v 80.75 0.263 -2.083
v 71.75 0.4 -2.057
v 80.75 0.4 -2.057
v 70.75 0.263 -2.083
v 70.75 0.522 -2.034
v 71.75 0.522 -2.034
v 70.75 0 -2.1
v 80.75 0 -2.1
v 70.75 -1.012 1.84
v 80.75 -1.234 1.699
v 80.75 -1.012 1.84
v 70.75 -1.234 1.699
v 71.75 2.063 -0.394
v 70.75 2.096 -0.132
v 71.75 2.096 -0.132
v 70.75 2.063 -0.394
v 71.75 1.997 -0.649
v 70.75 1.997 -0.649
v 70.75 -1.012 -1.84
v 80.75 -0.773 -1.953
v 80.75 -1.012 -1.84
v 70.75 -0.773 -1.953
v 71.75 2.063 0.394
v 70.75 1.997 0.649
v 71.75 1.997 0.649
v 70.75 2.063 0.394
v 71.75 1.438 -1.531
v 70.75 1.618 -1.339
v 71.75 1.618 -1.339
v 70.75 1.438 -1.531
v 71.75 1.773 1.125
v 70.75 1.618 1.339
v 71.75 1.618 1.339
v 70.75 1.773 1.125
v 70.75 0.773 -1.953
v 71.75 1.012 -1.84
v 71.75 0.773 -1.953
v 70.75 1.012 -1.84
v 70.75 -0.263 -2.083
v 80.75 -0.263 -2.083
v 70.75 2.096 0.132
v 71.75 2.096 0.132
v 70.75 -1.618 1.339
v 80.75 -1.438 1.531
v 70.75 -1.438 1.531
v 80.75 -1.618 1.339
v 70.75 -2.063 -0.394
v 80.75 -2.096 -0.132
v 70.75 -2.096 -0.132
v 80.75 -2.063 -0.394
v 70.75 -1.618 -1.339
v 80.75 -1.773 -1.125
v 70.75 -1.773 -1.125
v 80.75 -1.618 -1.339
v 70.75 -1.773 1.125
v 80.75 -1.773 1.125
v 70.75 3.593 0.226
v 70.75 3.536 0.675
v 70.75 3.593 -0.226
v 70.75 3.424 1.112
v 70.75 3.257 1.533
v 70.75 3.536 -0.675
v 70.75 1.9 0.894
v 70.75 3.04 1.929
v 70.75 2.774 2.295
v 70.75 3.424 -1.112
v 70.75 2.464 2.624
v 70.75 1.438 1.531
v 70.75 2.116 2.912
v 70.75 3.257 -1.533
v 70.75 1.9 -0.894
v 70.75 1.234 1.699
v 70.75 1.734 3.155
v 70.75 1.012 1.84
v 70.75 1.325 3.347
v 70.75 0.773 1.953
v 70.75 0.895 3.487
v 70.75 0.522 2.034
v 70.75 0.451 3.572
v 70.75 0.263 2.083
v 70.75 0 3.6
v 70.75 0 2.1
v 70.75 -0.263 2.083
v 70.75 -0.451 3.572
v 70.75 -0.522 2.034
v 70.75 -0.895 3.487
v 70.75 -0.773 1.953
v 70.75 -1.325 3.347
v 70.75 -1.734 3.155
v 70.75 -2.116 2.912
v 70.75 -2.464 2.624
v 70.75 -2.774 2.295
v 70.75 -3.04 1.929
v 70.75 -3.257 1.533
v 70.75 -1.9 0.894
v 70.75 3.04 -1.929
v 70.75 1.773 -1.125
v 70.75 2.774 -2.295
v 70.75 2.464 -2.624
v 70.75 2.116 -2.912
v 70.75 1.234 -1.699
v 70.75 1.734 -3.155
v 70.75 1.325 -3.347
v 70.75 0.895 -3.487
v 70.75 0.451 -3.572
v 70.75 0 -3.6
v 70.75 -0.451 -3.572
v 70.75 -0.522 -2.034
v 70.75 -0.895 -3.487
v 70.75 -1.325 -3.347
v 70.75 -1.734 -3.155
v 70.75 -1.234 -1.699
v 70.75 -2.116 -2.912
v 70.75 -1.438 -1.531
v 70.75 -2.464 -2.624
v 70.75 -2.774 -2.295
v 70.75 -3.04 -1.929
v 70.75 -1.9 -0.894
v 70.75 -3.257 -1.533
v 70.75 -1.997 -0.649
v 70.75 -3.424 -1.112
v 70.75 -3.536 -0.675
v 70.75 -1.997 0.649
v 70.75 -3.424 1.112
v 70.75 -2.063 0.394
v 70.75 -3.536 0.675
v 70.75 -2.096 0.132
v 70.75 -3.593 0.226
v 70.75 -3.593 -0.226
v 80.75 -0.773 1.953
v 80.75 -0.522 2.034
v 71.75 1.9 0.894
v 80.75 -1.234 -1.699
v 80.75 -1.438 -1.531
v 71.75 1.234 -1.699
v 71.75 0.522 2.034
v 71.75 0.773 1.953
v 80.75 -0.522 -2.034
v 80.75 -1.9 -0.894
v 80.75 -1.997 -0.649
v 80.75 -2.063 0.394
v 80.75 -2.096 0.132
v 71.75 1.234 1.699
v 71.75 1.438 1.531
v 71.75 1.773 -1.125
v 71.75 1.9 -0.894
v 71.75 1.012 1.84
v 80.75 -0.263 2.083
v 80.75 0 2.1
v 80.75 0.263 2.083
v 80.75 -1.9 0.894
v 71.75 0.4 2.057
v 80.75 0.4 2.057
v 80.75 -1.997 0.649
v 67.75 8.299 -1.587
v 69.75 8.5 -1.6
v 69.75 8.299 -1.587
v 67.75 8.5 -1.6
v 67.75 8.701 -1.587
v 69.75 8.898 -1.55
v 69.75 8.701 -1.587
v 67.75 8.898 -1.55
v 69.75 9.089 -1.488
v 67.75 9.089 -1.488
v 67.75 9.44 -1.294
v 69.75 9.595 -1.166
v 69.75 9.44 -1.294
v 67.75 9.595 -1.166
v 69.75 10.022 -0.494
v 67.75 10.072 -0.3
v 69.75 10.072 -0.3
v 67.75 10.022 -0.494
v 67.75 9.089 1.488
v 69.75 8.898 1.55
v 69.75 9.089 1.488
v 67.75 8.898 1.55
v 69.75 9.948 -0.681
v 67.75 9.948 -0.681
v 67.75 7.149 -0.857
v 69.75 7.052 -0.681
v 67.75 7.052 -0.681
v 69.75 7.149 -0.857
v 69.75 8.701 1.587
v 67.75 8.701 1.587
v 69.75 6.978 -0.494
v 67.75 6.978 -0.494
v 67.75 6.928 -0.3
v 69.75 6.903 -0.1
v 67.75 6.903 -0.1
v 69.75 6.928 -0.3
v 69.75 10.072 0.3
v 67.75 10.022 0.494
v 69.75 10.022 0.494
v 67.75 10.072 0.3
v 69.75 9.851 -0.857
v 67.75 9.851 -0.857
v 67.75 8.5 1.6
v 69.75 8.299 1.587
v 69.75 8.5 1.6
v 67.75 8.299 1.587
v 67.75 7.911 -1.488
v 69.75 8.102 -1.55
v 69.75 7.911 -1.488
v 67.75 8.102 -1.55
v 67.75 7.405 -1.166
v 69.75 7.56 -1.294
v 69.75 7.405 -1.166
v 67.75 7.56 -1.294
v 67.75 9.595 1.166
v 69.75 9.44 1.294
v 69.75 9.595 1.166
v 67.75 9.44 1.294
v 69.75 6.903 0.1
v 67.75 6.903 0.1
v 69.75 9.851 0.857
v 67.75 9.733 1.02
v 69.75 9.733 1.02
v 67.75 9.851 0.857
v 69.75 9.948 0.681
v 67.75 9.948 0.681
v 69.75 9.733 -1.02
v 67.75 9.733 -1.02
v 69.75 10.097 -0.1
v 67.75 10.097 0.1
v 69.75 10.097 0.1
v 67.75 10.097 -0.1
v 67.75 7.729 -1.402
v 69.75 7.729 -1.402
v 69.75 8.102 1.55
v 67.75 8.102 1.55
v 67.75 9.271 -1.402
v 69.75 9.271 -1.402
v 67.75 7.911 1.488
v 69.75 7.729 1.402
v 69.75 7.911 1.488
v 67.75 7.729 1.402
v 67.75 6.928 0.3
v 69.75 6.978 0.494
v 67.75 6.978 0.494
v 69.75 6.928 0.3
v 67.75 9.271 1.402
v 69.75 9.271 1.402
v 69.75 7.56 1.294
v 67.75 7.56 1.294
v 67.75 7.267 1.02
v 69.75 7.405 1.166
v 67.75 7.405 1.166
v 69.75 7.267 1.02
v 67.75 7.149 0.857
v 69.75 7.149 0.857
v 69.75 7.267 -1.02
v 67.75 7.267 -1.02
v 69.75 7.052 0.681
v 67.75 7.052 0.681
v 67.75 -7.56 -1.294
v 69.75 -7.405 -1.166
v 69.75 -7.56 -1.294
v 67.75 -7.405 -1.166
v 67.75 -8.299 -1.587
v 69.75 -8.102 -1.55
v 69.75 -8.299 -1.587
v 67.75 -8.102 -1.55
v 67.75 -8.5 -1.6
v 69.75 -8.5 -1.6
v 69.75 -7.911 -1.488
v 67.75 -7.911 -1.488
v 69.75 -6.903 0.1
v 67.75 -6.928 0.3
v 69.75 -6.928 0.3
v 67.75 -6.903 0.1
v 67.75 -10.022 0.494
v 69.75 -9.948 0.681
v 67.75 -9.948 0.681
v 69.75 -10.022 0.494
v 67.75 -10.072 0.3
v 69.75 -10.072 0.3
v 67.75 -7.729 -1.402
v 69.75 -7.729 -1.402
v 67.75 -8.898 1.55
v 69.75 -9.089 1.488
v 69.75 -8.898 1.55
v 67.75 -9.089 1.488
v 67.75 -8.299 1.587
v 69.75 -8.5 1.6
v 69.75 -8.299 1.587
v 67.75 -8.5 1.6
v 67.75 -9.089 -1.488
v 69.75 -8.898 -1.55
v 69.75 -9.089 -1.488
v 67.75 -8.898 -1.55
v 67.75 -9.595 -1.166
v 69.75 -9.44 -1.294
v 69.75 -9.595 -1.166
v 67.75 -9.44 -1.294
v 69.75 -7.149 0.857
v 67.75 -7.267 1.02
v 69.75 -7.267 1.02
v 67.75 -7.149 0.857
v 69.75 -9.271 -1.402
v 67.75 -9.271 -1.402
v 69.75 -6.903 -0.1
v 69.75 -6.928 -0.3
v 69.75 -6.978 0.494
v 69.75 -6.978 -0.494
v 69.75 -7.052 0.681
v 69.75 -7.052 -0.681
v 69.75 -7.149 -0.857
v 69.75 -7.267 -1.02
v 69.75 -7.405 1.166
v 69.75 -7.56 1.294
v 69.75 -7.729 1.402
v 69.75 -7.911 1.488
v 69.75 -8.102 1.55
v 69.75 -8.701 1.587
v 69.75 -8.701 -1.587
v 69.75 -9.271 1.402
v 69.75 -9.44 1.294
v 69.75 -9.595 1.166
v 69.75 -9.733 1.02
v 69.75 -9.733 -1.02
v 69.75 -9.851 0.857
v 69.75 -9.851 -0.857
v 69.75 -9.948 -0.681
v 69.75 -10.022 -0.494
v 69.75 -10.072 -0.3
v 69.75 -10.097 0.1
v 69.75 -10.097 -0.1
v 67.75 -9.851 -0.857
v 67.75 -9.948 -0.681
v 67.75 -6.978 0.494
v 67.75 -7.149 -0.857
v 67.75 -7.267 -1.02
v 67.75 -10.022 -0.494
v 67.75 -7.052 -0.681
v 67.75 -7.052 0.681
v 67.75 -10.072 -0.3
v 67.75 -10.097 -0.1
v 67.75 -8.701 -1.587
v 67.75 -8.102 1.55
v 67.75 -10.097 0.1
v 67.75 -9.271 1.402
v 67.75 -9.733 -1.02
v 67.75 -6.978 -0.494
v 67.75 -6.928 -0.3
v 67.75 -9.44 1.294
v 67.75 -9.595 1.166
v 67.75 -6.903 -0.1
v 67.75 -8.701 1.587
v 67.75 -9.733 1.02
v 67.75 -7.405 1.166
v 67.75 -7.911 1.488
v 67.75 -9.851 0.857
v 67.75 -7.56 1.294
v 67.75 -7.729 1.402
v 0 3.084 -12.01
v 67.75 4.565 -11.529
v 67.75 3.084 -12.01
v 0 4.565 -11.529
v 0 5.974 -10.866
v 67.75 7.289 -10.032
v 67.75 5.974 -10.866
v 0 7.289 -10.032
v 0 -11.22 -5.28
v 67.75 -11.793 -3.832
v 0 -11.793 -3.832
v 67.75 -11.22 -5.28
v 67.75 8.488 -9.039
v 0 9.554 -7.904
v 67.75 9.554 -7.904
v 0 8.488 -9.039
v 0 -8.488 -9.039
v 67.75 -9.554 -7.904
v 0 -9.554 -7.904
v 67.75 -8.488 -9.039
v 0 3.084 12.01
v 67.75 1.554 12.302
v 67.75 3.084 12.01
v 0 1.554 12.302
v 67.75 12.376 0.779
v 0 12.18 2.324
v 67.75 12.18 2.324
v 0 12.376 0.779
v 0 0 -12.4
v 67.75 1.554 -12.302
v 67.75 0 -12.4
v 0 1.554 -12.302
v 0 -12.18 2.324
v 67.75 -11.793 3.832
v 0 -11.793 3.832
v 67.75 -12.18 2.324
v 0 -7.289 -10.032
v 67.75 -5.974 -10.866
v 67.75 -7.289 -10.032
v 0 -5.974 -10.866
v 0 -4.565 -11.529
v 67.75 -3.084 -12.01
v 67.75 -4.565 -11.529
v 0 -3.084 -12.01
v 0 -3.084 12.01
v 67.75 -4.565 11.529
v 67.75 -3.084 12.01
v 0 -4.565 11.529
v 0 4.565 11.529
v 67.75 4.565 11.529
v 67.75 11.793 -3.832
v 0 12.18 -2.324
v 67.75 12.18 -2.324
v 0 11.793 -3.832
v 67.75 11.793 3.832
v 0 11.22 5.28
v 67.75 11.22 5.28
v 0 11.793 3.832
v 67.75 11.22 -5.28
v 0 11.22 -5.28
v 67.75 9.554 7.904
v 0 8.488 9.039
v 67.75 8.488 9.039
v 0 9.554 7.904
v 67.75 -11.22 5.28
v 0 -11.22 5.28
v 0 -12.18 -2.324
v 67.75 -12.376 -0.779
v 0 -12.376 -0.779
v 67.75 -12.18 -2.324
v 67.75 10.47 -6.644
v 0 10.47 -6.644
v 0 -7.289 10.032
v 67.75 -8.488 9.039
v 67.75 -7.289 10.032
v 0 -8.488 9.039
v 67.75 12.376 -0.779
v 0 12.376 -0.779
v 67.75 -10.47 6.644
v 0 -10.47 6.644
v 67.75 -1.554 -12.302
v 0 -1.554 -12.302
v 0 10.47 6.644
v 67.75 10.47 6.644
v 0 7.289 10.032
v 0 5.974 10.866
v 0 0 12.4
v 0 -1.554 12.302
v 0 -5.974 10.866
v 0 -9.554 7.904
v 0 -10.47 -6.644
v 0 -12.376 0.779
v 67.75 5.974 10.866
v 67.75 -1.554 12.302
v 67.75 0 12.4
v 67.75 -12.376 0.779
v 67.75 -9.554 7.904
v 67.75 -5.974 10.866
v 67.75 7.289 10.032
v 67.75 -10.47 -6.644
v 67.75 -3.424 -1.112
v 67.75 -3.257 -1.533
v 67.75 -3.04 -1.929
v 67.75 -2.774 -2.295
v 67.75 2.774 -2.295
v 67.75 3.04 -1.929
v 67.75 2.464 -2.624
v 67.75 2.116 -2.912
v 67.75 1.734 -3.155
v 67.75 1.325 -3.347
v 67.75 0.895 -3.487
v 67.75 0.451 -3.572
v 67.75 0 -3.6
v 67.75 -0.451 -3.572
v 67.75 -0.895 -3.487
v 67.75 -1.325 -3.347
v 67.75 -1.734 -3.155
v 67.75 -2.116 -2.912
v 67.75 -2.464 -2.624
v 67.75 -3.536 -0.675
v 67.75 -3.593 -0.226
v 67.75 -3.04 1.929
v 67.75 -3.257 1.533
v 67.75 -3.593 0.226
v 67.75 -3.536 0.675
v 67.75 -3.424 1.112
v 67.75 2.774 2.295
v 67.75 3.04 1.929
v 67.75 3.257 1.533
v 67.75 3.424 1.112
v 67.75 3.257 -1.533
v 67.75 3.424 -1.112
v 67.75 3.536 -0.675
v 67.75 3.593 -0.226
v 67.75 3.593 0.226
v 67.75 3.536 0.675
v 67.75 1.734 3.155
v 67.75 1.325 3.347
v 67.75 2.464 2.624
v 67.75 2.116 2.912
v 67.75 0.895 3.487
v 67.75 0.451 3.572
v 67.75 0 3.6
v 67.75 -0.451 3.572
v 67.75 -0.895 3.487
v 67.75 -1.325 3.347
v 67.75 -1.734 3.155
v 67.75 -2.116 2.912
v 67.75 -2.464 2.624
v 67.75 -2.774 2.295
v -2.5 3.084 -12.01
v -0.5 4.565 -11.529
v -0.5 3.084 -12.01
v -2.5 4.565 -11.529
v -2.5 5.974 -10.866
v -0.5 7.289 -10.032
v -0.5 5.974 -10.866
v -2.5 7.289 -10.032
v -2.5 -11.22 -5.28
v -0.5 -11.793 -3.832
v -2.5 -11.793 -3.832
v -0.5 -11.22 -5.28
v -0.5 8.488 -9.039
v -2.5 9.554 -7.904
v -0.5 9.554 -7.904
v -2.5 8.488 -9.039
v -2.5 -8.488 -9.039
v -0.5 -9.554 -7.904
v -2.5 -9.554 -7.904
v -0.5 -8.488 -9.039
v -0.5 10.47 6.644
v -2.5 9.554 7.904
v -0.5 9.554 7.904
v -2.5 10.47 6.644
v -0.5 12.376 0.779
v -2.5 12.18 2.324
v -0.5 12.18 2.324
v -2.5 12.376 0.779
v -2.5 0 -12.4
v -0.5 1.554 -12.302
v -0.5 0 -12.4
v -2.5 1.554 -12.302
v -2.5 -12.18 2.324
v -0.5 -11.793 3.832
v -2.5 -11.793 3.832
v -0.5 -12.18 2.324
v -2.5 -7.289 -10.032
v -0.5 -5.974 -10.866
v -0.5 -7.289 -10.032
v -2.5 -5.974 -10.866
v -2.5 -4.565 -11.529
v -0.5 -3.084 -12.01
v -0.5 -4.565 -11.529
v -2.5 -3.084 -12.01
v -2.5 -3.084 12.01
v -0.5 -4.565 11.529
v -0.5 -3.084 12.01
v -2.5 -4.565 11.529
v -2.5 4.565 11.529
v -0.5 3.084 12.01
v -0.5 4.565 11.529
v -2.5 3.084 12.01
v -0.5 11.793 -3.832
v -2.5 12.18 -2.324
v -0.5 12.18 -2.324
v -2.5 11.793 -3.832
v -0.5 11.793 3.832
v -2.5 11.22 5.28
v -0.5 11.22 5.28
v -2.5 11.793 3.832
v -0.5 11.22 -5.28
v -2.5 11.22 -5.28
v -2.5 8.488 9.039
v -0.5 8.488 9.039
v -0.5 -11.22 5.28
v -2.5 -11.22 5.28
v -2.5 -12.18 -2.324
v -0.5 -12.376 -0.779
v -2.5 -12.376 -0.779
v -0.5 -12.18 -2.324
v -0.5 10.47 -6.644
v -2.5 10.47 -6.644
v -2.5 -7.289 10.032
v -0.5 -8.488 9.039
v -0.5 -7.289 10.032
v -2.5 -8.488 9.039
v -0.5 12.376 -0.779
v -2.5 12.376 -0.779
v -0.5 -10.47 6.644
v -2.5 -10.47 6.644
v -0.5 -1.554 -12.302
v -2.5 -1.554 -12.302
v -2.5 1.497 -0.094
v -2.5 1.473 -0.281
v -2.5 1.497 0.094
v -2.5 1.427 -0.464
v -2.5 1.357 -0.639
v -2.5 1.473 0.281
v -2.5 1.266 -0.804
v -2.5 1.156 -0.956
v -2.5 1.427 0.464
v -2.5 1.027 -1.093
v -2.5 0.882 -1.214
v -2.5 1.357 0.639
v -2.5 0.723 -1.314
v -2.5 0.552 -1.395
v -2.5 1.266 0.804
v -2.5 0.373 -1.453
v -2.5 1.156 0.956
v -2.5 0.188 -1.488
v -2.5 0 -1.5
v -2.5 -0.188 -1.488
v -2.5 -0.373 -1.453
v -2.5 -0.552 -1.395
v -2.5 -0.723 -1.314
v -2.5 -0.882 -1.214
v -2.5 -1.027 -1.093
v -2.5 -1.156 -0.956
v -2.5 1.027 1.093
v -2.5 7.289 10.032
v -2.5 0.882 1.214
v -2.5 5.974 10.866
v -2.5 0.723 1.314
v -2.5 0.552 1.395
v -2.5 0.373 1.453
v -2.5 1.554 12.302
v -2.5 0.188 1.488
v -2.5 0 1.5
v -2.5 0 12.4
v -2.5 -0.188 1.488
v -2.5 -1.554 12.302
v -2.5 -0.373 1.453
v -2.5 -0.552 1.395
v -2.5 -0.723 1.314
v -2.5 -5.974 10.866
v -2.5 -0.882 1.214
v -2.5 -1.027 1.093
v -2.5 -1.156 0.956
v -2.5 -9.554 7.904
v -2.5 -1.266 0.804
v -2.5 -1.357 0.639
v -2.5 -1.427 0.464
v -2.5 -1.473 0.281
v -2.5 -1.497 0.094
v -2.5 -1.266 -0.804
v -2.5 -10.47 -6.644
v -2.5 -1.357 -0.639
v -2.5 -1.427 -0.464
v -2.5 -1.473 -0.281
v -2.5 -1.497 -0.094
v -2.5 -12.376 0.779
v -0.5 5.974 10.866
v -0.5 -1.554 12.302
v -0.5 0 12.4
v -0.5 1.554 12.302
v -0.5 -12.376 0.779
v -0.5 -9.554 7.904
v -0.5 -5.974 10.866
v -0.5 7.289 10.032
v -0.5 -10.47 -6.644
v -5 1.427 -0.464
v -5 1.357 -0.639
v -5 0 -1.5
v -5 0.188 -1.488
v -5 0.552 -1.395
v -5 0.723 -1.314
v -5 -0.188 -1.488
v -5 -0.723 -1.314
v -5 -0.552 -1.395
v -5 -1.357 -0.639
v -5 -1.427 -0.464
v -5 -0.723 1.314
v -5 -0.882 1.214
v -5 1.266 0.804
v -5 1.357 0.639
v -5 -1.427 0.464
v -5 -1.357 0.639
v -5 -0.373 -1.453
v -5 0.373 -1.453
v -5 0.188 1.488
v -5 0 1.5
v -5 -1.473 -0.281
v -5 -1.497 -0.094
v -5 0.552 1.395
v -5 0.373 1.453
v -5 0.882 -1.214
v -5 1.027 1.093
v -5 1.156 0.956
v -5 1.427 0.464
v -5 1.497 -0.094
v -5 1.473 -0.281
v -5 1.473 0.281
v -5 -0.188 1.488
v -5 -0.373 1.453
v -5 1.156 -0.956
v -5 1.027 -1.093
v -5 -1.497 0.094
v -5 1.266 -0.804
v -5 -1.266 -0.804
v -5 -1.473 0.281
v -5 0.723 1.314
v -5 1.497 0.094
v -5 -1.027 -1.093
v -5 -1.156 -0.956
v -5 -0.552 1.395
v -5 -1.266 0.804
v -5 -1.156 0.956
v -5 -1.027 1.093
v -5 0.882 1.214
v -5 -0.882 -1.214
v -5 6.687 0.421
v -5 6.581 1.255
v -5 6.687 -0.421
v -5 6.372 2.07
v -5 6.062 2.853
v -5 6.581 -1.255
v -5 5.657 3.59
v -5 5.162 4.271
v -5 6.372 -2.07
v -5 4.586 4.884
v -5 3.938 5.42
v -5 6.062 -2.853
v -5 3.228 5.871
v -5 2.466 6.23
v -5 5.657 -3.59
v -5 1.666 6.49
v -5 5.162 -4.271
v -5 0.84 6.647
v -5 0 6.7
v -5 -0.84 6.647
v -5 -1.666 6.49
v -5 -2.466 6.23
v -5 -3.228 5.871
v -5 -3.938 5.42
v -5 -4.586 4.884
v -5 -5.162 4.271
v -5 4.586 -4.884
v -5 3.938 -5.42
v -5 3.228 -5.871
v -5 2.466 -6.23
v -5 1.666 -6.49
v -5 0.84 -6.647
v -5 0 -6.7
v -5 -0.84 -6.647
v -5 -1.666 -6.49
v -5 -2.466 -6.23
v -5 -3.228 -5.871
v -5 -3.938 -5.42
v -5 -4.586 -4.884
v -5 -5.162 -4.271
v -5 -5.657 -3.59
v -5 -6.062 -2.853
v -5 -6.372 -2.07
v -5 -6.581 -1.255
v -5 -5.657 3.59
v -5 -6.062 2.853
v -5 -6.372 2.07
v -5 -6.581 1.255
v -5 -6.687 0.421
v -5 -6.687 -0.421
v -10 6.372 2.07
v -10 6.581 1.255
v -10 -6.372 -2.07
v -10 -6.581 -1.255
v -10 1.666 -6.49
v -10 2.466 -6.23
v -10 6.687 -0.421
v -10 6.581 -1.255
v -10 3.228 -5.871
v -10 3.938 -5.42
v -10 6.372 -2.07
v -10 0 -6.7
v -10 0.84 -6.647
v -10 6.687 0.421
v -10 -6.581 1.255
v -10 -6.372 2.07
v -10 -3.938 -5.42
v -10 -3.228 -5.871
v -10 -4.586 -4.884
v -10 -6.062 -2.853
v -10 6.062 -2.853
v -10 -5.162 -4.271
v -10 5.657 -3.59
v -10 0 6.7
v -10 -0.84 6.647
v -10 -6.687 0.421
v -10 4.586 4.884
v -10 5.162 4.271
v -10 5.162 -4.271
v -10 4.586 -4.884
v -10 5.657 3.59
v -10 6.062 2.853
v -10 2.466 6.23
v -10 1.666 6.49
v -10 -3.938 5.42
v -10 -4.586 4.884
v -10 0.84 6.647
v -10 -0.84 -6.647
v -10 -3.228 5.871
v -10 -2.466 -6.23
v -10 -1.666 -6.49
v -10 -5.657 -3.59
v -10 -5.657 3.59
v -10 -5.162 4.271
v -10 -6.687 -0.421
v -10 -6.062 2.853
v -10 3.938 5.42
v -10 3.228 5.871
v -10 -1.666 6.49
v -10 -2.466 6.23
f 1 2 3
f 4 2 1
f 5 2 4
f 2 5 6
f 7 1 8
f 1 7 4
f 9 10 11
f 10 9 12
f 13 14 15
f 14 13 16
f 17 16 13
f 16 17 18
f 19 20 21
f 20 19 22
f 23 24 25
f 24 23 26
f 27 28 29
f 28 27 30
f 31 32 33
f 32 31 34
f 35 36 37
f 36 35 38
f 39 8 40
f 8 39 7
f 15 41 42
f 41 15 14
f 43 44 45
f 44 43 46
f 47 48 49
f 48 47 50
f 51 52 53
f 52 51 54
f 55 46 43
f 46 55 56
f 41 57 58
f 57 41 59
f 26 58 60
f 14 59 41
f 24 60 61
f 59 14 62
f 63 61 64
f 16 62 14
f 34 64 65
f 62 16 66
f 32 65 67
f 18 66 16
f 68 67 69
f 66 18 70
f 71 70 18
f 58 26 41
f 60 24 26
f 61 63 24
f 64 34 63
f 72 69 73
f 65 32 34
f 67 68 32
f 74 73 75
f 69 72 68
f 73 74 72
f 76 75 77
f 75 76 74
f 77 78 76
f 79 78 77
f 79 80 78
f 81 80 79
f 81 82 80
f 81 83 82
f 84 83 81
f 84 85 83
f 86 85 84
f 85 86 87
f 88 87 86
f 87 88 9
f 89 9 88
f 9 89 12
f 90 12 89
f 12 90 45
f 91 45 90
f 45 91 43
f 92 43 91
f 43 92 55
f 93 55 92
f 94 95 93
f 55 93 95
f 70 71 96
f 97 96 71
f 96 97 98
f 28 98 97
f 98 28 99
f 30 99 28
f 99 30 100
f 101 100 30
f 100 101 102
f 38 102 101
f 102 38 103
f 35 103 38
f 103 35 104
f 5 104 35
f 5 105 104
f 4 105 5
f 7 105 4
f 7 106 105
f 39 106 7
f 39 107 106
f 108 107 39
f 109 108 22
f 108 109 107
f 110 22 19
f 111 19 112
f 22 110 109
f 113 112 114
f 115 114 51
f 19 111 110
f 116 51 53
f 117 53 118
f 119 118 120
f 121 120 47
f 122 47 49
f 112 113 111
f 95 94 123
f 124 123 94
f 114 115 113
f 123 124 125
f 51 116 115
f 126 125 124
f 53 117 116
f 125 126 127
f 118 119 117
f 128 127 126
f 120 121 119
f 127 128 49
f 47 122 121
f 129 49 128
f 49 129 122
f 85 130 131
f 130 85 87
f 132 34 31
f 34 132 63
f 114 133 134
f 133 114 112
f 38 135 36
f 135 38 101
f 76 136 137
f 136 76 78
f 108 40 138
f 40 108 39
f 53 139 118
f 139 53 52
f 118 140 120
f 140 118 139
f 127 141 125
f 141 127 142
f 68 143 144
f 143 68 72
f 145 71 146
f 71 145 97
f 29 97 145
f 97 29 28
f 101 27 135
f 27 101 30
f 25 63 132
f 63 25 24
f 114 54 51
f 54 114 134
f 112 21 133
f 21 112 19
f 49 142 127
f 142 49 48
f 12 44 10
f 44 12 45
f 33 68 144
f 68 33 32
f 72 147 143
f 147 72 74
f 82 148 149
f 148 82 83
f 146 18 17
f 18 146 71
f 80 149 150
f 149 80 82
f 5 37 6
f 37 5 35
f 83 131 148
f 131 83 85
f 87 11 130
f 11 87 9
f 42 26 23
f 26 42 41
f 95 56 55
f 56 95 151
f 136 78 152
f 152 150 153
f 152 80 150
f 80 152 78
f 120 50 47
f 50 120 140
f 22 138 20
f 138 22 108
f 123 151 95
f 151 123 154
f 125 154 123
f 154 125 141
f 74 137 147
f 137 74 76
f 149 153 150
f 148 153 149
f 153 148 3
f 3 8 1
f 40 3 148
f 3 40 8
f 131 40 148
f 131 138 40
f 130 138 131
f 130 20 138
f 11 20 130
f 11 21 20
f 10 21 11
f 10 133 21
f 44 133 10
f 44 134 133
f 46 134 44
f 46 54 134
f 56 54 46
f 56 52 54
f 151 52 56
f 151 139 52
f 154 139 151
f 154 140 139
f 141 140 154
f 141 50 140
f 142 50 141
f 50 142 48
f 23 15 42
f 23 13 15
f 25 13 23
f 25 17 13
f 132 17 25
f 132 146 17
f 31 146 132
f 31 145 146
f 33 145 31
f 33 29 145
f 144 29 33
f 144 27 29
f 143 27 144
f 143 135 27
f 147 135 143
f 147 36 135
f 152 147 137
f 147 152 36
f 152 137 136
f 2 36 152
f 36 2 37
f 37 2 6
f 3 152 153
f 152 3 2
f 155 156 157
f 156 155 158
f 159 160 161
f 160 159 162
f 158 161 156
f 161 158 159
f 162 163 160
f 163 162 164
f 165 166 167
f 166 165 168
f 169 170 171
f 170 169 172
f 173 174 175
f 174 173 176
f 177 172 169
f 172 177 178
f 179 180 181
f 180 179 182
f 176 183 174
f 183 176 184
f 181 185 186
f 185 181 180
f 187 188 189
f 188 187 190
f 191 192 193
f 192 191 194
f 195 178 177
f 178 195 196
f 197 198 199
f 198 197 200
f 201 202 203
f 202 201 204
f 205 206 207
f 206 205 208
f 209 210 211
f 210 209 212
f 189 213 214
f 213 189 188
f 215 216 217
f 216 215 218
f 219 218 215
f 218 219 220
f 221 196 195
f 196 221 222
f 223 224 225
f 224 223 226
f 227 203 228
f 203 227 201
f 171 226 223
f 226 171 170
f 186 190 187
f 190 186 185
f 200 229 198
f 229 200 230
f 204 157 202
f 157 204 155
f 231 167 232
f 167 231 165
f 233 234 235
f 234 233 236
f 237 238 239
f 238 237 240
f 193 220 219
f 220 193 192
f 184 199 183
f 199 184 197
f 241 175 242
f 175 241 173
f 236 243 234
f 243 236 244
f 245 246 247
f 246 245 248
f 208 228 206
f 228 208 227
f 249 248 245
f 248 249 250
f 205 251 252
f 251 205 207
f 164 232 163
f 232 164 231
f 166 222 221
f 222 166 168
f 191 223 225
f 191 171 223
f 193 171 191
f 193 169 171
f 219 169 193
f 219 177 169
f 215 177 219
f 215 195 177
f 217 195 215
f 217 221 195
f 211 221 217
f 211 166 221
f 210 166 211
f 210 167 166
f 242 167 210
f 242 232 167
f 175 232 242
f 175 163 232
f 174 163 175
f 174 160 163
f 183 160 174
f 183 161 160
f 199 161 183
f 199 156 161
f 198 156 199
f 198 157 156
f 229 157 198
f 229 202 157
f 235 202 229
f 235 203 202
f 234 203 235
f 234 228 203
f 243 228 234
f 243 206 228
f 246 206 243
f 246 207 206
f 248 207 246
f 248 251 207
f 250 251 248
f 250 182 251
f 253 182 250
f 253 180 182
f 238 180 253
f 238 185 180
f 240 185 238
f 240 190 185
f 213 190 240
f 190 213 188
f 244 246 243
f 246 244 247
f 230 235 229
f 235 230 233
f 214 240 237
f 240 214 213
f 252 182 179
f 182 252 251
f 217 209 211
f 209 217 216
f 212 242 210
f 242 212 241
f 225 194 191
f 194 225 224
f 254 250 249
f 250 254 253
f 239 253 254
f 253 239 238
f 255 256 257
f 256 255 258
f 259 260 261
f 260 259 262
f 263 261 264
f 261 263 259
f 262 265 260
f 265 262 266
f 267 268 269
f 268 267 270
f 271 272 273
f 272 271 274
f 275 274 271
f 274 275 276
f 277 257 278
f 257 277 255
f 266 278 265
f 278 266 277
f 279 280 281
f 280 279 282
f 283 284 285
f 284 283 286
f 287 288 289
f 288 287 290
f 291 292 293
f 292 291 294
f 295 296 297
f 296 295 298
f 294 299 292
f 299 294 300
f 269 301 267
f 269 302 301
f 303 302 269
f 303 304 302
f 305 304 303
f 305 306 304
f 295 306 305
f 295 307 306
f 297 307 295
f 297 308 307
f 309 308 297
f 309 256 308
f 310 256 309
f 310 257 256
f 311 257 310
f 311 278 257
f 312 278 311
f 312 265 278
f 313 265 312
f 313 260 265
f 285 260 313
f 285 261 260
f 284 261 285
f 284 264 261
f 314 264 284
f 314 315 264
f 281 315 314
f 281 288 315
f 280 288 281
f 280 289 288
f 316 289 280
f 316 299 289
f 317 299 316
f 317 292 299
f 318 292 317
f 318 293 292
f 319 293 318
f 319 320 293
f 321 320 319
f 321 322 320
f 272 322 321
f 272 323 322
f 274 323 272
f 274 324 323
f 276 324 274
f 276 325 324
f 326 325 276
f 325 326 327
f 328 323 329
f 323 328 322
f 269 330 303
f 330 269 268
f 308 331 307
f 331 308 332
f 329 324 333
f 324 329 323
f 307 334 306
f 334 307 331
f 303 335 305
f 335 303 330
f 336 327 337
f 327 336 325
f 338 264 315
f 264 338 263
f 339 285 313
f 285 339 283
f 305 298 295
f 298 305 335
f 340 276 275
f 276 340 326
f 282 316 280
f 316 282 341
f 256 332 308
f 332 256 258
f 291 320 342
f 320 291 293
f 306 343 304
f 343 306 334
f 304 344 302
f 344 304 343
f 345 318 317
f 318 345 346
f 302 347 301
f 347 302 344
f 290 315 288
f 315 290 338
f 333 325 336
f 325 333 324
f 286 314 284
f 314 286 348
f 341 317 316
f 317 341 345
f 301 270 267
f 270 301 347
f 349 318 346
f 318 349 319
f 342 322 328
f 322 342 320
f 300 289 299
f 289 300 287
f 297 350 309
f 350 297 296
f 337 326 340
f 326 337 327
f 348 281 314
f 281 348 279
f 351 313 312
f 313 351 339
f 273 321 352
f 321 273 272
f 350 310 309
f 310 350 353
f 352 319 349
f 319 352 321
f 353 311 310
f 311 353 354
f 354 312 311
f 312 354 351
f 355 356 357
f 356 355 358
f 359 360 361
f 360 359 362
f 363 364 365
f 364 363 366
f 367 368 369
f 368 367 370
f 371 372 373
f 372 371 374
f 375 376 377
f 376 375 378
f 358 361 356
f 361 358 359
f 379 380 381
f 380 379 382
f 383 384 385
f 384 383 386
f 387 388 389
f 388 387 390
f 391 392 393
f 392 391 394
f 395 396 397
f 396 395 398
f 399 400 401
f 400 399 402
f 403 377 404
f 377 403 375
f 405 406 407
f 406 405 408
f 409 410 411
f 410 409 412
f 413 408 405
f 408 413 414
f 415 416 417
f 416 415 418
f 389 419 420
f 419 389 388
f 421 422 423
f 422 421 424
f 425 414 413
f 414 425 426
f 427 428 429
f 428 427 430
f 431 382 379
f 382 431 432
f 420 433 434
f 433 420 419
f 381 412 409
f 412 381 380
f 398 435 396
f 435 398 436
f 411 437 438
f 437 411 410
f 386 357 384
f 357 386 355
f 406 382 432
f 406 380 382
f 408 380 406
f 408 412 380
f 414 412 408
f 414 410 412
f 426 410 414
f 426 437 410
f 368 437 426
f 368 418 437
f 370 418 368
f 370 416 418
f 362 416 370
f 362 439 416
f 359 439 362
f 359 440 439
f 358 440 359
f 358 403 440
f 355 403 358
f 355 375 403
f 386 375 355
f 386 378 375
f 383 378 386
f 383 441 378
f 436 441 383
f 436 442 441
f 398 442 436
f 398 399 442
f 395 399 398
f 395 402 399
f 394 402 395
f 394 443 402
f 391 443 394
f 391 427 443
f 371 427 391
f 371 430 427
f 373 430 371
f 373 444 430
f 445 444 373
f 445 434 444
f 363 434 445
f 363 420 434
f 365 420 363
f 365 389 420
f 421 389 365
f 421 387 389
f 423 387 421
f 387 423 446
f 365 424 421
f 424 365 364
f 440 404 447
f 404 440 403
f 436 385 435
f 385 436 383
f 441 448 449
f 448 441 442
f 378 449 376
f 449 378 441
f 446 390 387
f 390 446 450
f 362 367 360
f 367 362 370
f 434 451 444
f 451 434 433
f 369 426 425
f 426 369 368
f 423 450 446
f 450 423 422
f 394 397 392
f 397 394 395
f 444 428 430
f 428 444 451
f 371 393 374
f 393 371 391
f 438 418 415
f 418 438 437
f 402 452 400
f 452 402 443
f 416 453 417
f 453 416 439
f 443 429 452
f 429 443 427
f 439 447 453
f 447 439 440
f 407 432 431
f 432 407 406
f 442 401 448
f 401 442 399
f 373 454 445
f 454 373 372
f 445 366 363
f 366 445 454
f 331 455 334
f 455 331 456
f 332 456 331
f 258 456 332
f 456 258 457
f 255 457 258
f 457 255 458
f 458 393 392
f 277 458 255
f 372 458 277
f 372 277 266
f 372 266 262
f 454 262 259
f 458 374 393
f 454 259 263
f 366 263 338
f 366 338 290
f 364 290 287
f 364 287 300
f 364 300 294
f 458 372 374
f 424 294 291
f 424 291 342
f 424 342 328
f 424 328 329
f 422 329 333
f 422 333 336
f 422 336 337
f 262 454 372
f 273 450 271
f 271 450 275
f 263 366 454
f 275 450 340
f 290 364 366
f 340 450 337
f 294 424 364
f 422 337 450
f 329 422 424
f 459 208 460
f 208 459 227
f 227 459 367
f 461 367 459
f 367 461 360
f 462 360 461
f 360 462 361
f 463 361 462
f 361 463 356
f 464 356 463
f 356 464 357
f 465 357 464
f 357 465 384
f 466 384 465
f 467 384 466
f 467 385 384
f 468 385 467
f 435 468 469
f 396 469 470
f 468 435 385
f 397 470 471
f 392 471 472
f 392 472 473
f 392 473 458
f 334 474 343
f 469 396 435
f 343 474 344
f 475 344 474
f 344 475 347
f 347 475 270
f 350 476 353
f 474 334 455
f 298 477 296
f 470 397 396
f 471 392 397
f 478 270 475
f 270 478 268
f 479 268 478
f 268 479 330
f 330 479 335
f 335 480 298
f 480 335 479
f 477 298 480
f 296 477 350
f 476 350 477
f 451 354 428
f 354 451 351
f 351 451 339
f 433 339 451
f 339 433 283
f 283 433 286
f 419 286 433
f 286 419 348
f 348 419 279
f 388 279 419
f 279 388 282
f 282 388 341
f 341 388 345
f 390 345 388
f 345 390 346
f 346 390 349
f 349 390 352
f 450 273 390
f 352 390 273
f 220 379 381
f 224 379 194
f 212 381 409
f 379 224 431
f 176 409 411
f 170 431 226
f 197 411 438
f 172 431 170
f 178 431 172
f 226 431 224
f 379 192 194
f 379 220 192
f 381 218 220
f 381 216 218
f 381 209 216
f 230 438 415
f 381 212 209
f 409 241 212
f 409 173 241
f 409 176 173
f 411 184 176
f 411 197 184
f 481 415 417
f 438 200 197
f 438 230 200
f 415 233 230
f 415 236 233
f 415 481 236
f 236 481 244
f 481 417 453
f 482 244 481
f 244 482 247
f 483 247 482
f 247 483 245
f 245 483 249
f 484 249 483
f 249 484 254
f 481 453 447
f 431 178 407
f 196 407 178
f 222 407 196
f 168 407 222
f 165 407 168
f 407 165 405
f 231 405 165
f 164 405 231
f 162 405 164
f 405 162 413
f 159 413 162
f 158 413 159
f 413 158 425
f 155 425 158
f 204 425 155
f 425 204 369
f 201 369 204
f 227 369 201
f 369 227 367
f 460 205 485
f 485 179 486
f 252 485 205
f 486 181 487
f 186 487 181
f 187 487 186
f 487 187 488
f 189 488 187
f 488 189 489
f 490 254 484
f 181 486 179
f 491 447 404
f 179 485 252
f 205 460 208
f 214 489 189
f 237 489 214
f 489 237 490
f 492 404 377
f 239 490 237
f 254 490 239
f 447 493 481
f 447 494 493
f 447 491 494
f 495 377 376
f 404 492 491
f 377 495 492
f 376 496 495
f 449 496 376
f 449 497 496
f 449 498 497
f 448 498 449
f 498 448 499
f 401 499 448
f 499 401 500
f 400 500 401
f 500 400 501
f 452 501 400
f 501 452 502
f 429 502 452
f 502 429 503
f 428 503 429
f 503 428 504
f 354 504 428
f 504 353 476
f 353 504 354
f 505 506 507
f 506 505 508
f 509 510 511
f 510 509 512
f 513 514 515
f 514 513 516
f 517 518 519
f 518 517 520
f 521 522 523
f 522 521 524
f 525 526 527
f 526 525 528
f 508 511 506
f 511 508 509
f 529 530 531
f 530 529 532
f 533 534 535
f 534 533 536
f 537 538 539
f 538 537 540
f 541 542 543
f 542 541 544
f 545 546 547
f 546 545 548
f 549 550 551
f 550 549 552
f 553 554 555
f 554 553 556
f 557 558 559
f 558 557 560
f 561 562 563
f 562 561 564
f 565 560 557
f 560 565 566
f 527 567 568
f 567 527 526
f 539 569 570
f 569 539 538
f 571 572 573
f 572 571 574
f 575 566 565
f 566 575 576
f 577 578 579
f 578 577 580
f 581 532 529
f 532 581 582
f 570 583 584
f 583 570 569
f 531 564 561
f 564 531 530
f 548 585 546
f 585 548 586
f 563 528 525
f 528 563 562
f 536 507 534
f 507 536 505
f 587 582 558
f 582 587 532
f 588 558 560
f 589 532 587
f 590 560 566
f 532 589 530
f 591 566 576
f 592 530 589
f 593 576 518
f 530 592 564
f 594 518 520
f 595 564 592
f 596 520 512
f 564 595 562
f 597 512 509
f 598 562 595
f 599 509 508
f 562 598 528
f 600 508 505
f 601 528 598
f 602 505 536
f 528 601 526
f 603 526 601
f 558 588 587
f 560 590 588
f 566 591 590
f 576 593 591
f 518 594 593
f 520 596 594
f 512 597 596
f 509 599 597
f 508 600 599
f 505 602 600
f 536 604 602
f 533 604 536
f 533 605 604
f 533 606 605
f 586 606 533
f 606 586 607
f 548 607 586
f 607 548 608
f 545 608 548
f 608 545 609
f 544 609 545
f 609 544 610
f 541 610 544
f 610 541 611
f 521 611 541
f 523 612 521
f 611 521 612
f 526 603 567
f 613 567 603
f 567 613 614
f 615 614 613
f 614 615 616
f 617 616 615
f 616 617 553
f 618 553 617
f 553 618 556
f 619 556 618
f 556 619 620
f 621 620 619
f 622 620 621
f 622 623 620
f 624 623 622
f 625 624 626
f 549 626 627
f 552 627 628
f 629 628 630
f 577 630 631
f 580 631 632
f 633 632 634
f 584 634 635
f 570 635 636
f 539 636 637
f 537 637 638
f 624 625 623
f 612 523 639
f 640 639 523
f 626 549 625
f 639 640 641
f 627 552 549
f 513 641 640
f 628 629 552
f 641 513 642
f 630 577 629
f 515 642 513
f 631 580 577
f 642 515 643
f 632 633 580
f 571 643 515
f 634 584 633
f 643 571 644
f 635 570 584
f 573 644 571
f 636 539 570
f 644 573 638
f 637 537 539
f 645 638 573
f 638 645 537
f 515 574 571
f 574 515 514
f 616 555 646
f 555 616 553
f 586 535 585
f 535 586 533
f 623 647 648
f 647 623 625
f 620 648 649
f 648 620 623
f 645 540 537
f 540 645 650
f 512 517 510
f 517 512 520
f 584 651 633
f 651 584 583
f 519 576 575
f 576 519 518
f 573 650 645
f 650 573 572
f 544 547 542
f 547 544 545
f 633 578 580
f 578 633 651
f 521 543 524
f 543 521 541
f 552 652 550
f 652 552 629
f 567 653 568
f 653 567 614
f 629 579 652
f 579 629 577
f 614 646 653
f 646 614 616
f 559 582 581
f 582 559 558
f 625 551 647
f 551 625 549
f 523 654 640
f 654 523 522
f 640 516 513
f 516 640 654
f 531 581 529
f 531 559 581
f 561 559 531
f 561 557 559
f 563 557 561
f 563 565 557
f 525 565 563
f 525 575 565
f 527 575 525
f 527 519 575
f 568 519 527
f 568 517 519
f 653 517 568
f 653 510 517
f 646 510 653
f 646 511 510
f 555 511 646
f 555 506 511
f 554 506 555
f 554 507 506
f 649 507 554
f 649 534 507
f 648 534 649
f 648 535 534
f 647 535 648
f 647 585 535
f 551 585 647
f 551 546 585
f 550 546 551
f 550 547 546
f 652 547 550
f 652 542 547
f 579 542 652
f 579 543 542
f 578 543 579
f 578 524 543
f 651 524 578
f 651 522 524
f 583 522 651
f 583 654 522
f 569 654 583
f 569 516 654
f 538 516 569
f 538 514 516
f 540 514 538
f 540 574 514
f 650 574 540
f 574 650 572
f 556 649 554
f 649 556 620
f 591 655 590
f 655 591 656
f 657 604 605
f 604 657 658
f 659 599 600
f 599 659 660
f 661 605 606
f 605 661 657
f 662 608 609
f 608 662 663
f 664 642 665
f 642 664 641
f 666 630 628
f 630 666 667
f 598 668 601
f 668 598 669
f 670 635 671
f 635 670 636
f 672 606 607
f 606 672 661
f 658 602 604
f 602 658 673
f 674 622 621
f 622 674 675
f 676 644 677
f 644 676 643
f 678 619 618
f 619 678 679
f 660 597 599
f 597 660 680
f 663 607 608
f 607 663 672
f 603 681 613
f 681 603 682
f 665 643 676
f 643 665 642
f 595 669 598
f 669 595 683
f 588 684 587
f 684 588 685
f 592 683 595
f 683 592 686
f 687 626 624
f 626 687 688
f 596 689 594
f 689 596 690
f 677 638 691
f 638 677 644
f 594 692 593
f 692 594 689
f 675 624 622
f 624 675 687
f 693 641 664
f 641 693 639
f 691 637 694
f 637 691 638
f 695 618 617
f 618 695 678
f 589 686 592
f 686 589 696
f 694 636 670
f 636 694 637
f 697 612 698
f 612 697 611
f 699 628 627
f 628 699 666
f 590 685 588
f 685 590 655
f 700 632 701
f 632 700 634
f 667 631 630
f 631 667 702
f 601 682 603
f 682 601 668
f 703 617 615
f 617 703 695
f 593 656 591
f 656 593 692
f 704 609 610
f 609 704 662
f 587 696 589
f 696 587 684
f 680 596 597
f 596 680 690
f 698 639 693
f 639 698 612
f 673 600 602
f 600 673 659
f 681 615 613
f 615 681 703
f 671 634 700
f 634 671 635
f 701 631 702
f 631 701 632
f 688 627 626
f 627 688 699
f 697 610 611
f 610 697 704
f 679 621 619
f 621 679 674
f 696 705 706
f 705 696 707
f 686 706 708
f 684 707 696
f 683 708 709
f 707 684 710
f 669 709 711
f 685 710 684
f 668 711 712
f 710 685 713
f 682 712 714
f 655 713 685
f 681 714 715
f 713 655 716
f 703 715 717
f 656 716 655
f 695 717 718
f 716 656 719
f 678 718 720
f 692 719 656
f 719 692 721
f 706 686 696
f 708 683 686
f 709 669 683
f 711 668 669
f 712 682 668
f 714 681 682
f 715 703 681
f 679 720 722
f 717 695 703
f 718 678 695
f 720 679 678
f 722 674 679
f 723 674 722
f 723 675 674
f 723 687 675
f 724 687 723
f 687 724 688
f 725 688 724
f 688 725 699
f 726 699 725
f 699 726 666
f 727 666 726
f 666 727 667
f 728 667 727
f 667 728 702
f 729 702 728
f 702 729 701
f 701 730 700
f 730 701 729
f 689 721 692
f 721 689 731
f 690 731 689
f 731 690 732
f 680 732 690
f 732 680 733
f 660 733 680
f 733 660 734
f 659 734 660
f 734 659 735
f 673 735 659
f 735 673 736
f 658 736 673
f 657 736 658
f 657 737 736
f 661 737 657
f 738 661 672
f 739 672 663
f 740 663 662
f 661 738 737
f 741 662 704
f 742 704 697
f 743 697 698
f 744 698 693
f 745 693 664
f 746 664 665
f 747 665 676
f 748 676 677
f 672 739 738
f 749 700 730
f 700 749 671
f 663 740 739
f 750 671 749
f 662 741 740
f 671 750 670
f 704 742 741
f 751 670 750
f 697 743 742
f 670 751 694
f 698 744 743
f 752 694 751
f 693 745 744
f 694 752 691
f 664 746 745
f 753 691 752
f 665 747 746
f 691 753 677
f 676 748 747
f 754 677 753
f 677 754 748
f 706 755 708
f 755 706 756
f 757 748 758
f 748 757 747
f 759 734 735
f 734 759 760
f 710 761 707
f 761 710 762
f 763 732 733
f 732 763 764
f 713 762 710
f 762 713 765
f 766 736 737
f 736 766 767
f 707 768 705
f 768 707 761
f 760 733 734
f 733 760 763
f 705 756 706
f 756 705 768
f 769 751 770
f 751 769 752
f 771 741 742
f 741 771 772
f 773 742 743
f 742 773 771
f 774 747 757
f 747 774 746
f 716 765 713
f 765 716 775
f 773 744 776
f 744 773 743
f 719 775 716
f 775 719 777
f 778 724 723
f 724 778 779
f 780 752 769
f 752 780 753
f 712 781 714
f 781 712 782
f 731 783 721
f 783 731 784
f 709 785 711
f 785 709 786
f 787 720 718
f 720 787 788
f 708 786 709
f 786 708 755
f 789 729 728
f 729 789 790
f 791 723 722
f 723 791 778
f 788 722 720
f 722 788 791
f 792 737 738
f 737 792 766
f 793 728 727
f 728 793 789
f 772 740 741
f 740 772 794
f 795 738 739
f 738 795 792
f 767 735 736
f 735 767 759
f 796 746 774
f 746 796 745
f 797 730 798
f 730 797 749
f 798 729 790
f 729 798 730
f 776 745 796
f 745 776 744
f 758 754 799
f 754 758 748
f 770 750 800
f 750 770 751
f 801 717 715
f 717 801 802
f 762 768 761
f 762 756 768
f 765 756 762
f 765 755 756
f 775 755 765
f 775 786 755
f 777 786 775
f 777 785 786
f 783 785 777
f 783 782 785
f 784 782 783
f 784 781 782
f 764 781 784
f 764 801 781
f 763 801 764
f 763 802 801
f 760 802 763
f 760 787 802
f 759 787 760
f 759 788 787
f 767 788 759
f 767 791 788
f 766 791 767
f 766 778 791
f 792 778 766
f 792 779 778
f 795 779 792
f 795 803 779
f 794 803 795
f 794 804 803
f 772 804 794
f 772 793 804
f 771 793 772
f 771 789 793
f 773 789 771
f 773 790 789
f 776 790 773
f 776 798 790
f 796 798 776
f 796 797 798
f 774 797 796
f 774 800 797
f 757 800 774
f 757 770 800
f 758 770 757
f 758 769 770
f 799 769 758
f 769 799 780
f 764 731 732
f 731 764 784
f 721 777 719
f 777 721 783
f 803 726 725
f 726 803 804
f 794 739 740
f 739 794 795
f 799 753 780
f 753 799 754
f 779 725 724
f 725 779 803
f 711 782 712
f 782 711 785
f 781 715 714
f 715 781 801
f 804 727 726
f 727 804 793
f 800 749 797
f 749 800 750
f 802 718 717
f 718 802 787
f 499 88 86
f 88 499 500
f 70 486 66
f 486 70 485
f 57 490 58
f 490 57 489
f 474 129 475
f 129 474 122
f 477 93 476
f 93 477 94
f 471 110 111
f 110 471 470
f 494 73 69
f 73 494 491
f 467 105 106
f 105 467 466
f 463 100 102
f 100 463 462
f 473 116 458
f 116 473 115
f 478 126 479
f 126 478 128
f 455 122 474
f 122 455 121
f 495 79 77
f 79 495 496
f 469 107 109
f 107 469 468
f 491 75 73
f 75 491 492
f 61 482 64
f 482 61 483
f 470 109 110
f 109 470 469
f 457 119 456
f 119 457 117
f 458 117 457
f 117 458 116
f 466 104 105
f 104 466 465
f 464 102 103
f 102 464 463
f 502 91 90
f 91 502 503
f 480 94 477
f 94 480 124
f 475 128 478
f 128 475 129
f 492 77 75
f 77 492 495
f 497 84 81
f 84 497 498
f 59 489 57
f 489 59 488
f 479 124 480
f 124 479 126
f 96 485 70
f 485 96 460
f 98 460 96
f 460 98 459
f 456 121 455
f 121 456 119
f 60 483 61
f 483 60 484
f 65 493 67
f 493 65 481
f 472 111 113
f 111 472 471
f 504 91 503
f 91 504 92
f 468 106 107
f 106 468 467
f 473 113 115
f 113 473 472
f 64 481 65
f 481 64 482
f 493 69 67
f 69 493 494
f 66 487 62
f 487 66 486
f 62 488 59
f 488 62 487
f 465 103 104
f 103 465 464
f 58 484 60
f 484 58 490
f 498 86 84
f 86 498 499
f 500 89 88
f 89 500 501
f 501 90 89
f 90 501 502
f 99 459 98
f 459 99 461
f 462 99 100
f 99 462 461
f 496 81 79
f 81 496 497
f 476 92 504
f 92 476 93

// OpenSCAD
// file: ../robot_settings.scad
main_box_x = 100; // 96
main_box_y = 102;
main_box_z = 74; // 74.5

lfp_main_box_x = 66;
lfp_main_box_y = 151;
lfp_main_box_z = 95;

wall_thickness = 2;

rail_gap = 2;
rail_inset = 7;

rail_thickness = 7;
rail_length = 250;
rail_width = 290;

lfp_battery_width = 65.5;
lfp_battery_depth = 150.5;
lfp_battery_height = 93;
lfp_battery_midterrace_width = 64.8;
lfp_battery_midterrace_depth = 150.2;
lfp_battery_midterrace_height = 7.8;
lfp_battery_topterrace_width = 62.8;
lfp_battery_topterrace_depth = 149.4;
lfp_battery_topterrace_height = 6.6;

// red right
// black left
lfp_battery_terminal_width = 9.2;
lfp_battery_terminal_depth = 9.5;
lfp_battery_terminal_depth_setback = 14.4;
lfp_battery_terminal_width_setback = 5.9;

raspberry_pi_screw_seperation_y = 57;
raspberry_pi_screw_seperation_z = 48;
raspberry_pi_peg_h = 5;

battery_box_peg_h = 6;
battery_box_peg_d = 8;
battery_box_peg_cutout = 5;

gears_module = 1;
pinion_gear_teeth = 32;
pinion_gear_width = 5;
pinion_gear_bore = 8;

gears_setback_distance = 25;
gear_post_height = 2 * pinion_gear_width + rail_thickness + 8 ;

steering_motor_mount_x = 45;
steering_motor_mount_y = 36;
steering_motor_mount_z = 18;
steering_motor_mount_setback_distance = gears_setback_distance + 16;

dc_motor_drivertype = "Teyleten"; // Teyleten
isAdafruit = (dc_motor_drivertype == "Adafruit");

drv8871_x = isAdafruit ? 20.3 : 21.6;
drv8871_y = isAdafruit ?  24 : 25;

drv8871_z = 2;
drv8871_screw_d = 2.5;
drv8871_solder_points_z = 2;

drv8871mount_edge_x = 1.5;
drv8871mount_edge_wall = 3;
drv8871mount_z = 5;
drv8871mount_x = drv8871_x +  drv8871mount_edge_wall - 2* drv8871mount_edge_x;
drv8871mount_y = 19;

drv8871_screw_distance = 15.64;
drv8871_solder_points_d = 1.66;
drv8871_solder_offset_y = 4.4;
drv8871_solder_inner_points_distance = 5;
drv8871_solder_outer_points_distance = 12;

dc_motor_75_1_encoder_z = 14.75;
dc_motor_75_1_encoder_d = 24.5;
dc_motor_75_1_housing_z = 30;
dc_motor_75_1_housing_d = 24.1;
dc_motor_75_1_gearbox_z = 23;
dc_motor_75_1_gearbox_d = 24.8;
dc_motor_75_1_z = dc_motor_75_1_encoder_z + dc_motor_75_1_housing_z + dc_motor_75_1_gearbox_z;

dc_motor_housing_minus_encoder_z = 48;
dc_motor_encoder_z = 9.33;
dc_motor_encoder_wheel_d = 13.4;
dc_motor_encoder_wheel_thickness = 5;
dc_motor_encoder_wheel_gap = 3;
dc_motor_encoder_circuit_thickness = 2;
dc_motor_cutout_d = 24.8;
dc_motor_cutout_z = 19.5;


M3_shaft_d = 2.82;

dc_motor_screw_head_z = 2;
dc_motor_screw_head_d = 5.6;
dc_motor_screw_d = 3.2;
dc_motor_screw_offset = 8.5;

dc_motor_axle_ring_z = 3;
dc_motor_axle_ring_d = 7.2;
dc_motor_axle_cutout_d = 4.2;
dc_motor_axle_cutout_z = 10;
dc_motor_axle_notch_cutout = 0.4;
dc_motor_axle_notch_cutout_z = 6;

pdmount_x = 20;
pdmount_y = 30;
pdmount_z = 2;
pdmount_edge_x = 1.5;
pdmount_edge_wall = 3;

steering_shaft_z = 45;
steering_shaft_d = 7;
steering_shaft_motor_fitting_d = 9;
coupler_length = 24.6;
coupler_diameter = 14;
coupler_screw_d = 4;
coupler_screw_z_offset = 5;
coupler_gear_side_insert = 12.6;
steering_shaft_with_coupler_z = steering_shaft_z - coupler_gear_side_insert;

lidar_mount_y = 110;
lidar_mount_x = 65 + 20;
lidar_narrow_screws = 40;
lidar_wide_screws = 56;
lidar_front_to_back_screws = 70;
lidar_screw_d = 3;
lidar_circuitboard_x = 20;
lidar_circuitboard_y = 35;
lidar_circuitboard_z = 1.2;
lidar_cord_length = 29;

ball_bearing_height = 7;
ball_bearing_outer_diameter = 22;
ball_bearing_inner_diameter = 8;

M4_diameter = 5.1;
M3_diameter = 2.9;
M3_length = 35;
M3_cap_length= 3;
M3_cap_diameter = 5.44;

suspension_spring_outer_diameter = 8;
suspension_spring_inner_diameter = 5.3;

armature_holder_height = 20;
armature_holder_thickness = 8;
pull_bar_peg_r = 3.2;
apparatus_locking_peg_d = 4;

rack_module = 1;
rack_length = main_box_x;
rack_height = 5;
rack_width = 10;
rack_teeth = 30;
rack_bore = 3;

pull_bar_length = rail_width / 2 - rack_length + 1;

// tire hardware
axle_length = 24 + ball_bearing_height; 
axle_reciever_inner_diameter = 8.2;
axle_reciever_outer_diameter = 12;
axle_reciever_length = 18.8;
axle_notch_length = 15;
axle_notch_cutout = 2.4;

// power distribution bar
power_bar_cutout_x = 96;
power_bar_y = 19.1;
power_bar_z = 1.5;
power_bar_screw_distance = 91.4;
power_bar_screw_d = 2.8;
power_bar_standoff_z = 5;
power_bar_standoff_d = 6.83;

pico_expander_width = 63;
pico_expander_height = 57;
pico_screw_hole_offset = 3;
pico_screw_hole_d = 2.5;

usbhub_thickness = 11.7;
usbhub_depth = 37.5;
usbhub_width = 86.7;
usbhub_end_port_width = 14.8;
usbhub_end_port_height = 12;
usbhub_front_face_safe_zone_left = 15;
usbhub_front_face_safe_zone_right = 14.8;

switch_w = 16;
switch_cutout_d = 12.2;
switch_bump_h = 2;
switch_bump_l = 18.2;

i2c_mount_thickness = 3;
i2c_w = 28;
i2c_l = 28;
i2c_circuitboard_thickness = 1.23;
i2c_bottom_notch_w = 14.35;
i2c_bottom_notch_depth = 1;
i2c_screw_hole_d = 1.9;
i2c_screw_hole_offset = 1.4;
i2c_pin_l = 11;
i2c_pin_d = 0.8;
i2c_pin_offset = 1.5;
i2c_pin_separation = 2.5;
i2c_all_pins_l = 8.3;
i2c_screen_thickness = 1.88;
i2c_screen_w = 14.6;
i2c_screen_d = 27;
i2c_screen_offset = 4.1;
// main file
 include <../robot_settings.scad> 
// 
  $fn = 50;
  
module dc_motor(motor_height = dc_motor_75_1_z)
{        
      rotate([0,90,0])
        cylinder(h = motor_height, d = dc_motor_cutout_d);
      
      // "circuit board"
      translate([
        -dc_motor_encoder_circuit_thickness - .5, 0, 0])
        rotate([0,90,0])
          cylinder(h = dc_motor_encoder_circuit_thickness, d = dc_motor_cutout_d);
      
      // axle to hat
      translate([
        -dc_motor_encoder_circuit_thickness - dc_motor_encoder_wheel_gap, 0, 0 ])
        rotate([0,90.0])
            cylinder(h = dc_motor_encoder_wheel_gap, d = 3);
      
      // encoder hat
      translate([
        -dc_motor_encoder_circuit_thickness - dc_motor_encoder_wheel_gap - dc_motor_encoder_wheel_thickness, 0, 0])
        rotate([0,90,0])
            cylinder(h = dc_motor_encoder_wheel_thickness, d = dc_motor_encoder_wheel_d);
       
       // axle ring
        translate([motor_height, 0, 0])
          rotate([0,90,0])
            cylinder(h = dc_motor_axle_ring_z, d = dc_motor_axle_ring_d);
        
        // axle
        translate([motor_height + dc_motor_axle_ring_z, 0, 0])
        rotate([0,90,0])
        {
            difference() {
              cylinder(h = dc_motor_axle_cutout_z, d = dc_motor_axle_cutout_d);          
              // axle notch
              translate([ -8, dc_motor_axle_notch_cutout, dc_motor_axle_cutout_z - axle_notch_length + 6])
                  cube([axle_notch_length, axle_reciever_inner_diameter / 2, dc_motor_axle_cutout_z]);
            }
          
          // screw holes
          color("blue")
          translate([0, dc_motor_screw_offset, - dc_motor_axle_ring_z - 1])
            cylinder(h = 3, d = dc_motor_screw_d);
          
          color("blue")         
          translate([0, -dc_motor_screw_offset, - dc_motor_axle_ring_z - 1])
            cylinder(h = 3, d = dc_motor_screw_d);
       }
}
dc_motor();
